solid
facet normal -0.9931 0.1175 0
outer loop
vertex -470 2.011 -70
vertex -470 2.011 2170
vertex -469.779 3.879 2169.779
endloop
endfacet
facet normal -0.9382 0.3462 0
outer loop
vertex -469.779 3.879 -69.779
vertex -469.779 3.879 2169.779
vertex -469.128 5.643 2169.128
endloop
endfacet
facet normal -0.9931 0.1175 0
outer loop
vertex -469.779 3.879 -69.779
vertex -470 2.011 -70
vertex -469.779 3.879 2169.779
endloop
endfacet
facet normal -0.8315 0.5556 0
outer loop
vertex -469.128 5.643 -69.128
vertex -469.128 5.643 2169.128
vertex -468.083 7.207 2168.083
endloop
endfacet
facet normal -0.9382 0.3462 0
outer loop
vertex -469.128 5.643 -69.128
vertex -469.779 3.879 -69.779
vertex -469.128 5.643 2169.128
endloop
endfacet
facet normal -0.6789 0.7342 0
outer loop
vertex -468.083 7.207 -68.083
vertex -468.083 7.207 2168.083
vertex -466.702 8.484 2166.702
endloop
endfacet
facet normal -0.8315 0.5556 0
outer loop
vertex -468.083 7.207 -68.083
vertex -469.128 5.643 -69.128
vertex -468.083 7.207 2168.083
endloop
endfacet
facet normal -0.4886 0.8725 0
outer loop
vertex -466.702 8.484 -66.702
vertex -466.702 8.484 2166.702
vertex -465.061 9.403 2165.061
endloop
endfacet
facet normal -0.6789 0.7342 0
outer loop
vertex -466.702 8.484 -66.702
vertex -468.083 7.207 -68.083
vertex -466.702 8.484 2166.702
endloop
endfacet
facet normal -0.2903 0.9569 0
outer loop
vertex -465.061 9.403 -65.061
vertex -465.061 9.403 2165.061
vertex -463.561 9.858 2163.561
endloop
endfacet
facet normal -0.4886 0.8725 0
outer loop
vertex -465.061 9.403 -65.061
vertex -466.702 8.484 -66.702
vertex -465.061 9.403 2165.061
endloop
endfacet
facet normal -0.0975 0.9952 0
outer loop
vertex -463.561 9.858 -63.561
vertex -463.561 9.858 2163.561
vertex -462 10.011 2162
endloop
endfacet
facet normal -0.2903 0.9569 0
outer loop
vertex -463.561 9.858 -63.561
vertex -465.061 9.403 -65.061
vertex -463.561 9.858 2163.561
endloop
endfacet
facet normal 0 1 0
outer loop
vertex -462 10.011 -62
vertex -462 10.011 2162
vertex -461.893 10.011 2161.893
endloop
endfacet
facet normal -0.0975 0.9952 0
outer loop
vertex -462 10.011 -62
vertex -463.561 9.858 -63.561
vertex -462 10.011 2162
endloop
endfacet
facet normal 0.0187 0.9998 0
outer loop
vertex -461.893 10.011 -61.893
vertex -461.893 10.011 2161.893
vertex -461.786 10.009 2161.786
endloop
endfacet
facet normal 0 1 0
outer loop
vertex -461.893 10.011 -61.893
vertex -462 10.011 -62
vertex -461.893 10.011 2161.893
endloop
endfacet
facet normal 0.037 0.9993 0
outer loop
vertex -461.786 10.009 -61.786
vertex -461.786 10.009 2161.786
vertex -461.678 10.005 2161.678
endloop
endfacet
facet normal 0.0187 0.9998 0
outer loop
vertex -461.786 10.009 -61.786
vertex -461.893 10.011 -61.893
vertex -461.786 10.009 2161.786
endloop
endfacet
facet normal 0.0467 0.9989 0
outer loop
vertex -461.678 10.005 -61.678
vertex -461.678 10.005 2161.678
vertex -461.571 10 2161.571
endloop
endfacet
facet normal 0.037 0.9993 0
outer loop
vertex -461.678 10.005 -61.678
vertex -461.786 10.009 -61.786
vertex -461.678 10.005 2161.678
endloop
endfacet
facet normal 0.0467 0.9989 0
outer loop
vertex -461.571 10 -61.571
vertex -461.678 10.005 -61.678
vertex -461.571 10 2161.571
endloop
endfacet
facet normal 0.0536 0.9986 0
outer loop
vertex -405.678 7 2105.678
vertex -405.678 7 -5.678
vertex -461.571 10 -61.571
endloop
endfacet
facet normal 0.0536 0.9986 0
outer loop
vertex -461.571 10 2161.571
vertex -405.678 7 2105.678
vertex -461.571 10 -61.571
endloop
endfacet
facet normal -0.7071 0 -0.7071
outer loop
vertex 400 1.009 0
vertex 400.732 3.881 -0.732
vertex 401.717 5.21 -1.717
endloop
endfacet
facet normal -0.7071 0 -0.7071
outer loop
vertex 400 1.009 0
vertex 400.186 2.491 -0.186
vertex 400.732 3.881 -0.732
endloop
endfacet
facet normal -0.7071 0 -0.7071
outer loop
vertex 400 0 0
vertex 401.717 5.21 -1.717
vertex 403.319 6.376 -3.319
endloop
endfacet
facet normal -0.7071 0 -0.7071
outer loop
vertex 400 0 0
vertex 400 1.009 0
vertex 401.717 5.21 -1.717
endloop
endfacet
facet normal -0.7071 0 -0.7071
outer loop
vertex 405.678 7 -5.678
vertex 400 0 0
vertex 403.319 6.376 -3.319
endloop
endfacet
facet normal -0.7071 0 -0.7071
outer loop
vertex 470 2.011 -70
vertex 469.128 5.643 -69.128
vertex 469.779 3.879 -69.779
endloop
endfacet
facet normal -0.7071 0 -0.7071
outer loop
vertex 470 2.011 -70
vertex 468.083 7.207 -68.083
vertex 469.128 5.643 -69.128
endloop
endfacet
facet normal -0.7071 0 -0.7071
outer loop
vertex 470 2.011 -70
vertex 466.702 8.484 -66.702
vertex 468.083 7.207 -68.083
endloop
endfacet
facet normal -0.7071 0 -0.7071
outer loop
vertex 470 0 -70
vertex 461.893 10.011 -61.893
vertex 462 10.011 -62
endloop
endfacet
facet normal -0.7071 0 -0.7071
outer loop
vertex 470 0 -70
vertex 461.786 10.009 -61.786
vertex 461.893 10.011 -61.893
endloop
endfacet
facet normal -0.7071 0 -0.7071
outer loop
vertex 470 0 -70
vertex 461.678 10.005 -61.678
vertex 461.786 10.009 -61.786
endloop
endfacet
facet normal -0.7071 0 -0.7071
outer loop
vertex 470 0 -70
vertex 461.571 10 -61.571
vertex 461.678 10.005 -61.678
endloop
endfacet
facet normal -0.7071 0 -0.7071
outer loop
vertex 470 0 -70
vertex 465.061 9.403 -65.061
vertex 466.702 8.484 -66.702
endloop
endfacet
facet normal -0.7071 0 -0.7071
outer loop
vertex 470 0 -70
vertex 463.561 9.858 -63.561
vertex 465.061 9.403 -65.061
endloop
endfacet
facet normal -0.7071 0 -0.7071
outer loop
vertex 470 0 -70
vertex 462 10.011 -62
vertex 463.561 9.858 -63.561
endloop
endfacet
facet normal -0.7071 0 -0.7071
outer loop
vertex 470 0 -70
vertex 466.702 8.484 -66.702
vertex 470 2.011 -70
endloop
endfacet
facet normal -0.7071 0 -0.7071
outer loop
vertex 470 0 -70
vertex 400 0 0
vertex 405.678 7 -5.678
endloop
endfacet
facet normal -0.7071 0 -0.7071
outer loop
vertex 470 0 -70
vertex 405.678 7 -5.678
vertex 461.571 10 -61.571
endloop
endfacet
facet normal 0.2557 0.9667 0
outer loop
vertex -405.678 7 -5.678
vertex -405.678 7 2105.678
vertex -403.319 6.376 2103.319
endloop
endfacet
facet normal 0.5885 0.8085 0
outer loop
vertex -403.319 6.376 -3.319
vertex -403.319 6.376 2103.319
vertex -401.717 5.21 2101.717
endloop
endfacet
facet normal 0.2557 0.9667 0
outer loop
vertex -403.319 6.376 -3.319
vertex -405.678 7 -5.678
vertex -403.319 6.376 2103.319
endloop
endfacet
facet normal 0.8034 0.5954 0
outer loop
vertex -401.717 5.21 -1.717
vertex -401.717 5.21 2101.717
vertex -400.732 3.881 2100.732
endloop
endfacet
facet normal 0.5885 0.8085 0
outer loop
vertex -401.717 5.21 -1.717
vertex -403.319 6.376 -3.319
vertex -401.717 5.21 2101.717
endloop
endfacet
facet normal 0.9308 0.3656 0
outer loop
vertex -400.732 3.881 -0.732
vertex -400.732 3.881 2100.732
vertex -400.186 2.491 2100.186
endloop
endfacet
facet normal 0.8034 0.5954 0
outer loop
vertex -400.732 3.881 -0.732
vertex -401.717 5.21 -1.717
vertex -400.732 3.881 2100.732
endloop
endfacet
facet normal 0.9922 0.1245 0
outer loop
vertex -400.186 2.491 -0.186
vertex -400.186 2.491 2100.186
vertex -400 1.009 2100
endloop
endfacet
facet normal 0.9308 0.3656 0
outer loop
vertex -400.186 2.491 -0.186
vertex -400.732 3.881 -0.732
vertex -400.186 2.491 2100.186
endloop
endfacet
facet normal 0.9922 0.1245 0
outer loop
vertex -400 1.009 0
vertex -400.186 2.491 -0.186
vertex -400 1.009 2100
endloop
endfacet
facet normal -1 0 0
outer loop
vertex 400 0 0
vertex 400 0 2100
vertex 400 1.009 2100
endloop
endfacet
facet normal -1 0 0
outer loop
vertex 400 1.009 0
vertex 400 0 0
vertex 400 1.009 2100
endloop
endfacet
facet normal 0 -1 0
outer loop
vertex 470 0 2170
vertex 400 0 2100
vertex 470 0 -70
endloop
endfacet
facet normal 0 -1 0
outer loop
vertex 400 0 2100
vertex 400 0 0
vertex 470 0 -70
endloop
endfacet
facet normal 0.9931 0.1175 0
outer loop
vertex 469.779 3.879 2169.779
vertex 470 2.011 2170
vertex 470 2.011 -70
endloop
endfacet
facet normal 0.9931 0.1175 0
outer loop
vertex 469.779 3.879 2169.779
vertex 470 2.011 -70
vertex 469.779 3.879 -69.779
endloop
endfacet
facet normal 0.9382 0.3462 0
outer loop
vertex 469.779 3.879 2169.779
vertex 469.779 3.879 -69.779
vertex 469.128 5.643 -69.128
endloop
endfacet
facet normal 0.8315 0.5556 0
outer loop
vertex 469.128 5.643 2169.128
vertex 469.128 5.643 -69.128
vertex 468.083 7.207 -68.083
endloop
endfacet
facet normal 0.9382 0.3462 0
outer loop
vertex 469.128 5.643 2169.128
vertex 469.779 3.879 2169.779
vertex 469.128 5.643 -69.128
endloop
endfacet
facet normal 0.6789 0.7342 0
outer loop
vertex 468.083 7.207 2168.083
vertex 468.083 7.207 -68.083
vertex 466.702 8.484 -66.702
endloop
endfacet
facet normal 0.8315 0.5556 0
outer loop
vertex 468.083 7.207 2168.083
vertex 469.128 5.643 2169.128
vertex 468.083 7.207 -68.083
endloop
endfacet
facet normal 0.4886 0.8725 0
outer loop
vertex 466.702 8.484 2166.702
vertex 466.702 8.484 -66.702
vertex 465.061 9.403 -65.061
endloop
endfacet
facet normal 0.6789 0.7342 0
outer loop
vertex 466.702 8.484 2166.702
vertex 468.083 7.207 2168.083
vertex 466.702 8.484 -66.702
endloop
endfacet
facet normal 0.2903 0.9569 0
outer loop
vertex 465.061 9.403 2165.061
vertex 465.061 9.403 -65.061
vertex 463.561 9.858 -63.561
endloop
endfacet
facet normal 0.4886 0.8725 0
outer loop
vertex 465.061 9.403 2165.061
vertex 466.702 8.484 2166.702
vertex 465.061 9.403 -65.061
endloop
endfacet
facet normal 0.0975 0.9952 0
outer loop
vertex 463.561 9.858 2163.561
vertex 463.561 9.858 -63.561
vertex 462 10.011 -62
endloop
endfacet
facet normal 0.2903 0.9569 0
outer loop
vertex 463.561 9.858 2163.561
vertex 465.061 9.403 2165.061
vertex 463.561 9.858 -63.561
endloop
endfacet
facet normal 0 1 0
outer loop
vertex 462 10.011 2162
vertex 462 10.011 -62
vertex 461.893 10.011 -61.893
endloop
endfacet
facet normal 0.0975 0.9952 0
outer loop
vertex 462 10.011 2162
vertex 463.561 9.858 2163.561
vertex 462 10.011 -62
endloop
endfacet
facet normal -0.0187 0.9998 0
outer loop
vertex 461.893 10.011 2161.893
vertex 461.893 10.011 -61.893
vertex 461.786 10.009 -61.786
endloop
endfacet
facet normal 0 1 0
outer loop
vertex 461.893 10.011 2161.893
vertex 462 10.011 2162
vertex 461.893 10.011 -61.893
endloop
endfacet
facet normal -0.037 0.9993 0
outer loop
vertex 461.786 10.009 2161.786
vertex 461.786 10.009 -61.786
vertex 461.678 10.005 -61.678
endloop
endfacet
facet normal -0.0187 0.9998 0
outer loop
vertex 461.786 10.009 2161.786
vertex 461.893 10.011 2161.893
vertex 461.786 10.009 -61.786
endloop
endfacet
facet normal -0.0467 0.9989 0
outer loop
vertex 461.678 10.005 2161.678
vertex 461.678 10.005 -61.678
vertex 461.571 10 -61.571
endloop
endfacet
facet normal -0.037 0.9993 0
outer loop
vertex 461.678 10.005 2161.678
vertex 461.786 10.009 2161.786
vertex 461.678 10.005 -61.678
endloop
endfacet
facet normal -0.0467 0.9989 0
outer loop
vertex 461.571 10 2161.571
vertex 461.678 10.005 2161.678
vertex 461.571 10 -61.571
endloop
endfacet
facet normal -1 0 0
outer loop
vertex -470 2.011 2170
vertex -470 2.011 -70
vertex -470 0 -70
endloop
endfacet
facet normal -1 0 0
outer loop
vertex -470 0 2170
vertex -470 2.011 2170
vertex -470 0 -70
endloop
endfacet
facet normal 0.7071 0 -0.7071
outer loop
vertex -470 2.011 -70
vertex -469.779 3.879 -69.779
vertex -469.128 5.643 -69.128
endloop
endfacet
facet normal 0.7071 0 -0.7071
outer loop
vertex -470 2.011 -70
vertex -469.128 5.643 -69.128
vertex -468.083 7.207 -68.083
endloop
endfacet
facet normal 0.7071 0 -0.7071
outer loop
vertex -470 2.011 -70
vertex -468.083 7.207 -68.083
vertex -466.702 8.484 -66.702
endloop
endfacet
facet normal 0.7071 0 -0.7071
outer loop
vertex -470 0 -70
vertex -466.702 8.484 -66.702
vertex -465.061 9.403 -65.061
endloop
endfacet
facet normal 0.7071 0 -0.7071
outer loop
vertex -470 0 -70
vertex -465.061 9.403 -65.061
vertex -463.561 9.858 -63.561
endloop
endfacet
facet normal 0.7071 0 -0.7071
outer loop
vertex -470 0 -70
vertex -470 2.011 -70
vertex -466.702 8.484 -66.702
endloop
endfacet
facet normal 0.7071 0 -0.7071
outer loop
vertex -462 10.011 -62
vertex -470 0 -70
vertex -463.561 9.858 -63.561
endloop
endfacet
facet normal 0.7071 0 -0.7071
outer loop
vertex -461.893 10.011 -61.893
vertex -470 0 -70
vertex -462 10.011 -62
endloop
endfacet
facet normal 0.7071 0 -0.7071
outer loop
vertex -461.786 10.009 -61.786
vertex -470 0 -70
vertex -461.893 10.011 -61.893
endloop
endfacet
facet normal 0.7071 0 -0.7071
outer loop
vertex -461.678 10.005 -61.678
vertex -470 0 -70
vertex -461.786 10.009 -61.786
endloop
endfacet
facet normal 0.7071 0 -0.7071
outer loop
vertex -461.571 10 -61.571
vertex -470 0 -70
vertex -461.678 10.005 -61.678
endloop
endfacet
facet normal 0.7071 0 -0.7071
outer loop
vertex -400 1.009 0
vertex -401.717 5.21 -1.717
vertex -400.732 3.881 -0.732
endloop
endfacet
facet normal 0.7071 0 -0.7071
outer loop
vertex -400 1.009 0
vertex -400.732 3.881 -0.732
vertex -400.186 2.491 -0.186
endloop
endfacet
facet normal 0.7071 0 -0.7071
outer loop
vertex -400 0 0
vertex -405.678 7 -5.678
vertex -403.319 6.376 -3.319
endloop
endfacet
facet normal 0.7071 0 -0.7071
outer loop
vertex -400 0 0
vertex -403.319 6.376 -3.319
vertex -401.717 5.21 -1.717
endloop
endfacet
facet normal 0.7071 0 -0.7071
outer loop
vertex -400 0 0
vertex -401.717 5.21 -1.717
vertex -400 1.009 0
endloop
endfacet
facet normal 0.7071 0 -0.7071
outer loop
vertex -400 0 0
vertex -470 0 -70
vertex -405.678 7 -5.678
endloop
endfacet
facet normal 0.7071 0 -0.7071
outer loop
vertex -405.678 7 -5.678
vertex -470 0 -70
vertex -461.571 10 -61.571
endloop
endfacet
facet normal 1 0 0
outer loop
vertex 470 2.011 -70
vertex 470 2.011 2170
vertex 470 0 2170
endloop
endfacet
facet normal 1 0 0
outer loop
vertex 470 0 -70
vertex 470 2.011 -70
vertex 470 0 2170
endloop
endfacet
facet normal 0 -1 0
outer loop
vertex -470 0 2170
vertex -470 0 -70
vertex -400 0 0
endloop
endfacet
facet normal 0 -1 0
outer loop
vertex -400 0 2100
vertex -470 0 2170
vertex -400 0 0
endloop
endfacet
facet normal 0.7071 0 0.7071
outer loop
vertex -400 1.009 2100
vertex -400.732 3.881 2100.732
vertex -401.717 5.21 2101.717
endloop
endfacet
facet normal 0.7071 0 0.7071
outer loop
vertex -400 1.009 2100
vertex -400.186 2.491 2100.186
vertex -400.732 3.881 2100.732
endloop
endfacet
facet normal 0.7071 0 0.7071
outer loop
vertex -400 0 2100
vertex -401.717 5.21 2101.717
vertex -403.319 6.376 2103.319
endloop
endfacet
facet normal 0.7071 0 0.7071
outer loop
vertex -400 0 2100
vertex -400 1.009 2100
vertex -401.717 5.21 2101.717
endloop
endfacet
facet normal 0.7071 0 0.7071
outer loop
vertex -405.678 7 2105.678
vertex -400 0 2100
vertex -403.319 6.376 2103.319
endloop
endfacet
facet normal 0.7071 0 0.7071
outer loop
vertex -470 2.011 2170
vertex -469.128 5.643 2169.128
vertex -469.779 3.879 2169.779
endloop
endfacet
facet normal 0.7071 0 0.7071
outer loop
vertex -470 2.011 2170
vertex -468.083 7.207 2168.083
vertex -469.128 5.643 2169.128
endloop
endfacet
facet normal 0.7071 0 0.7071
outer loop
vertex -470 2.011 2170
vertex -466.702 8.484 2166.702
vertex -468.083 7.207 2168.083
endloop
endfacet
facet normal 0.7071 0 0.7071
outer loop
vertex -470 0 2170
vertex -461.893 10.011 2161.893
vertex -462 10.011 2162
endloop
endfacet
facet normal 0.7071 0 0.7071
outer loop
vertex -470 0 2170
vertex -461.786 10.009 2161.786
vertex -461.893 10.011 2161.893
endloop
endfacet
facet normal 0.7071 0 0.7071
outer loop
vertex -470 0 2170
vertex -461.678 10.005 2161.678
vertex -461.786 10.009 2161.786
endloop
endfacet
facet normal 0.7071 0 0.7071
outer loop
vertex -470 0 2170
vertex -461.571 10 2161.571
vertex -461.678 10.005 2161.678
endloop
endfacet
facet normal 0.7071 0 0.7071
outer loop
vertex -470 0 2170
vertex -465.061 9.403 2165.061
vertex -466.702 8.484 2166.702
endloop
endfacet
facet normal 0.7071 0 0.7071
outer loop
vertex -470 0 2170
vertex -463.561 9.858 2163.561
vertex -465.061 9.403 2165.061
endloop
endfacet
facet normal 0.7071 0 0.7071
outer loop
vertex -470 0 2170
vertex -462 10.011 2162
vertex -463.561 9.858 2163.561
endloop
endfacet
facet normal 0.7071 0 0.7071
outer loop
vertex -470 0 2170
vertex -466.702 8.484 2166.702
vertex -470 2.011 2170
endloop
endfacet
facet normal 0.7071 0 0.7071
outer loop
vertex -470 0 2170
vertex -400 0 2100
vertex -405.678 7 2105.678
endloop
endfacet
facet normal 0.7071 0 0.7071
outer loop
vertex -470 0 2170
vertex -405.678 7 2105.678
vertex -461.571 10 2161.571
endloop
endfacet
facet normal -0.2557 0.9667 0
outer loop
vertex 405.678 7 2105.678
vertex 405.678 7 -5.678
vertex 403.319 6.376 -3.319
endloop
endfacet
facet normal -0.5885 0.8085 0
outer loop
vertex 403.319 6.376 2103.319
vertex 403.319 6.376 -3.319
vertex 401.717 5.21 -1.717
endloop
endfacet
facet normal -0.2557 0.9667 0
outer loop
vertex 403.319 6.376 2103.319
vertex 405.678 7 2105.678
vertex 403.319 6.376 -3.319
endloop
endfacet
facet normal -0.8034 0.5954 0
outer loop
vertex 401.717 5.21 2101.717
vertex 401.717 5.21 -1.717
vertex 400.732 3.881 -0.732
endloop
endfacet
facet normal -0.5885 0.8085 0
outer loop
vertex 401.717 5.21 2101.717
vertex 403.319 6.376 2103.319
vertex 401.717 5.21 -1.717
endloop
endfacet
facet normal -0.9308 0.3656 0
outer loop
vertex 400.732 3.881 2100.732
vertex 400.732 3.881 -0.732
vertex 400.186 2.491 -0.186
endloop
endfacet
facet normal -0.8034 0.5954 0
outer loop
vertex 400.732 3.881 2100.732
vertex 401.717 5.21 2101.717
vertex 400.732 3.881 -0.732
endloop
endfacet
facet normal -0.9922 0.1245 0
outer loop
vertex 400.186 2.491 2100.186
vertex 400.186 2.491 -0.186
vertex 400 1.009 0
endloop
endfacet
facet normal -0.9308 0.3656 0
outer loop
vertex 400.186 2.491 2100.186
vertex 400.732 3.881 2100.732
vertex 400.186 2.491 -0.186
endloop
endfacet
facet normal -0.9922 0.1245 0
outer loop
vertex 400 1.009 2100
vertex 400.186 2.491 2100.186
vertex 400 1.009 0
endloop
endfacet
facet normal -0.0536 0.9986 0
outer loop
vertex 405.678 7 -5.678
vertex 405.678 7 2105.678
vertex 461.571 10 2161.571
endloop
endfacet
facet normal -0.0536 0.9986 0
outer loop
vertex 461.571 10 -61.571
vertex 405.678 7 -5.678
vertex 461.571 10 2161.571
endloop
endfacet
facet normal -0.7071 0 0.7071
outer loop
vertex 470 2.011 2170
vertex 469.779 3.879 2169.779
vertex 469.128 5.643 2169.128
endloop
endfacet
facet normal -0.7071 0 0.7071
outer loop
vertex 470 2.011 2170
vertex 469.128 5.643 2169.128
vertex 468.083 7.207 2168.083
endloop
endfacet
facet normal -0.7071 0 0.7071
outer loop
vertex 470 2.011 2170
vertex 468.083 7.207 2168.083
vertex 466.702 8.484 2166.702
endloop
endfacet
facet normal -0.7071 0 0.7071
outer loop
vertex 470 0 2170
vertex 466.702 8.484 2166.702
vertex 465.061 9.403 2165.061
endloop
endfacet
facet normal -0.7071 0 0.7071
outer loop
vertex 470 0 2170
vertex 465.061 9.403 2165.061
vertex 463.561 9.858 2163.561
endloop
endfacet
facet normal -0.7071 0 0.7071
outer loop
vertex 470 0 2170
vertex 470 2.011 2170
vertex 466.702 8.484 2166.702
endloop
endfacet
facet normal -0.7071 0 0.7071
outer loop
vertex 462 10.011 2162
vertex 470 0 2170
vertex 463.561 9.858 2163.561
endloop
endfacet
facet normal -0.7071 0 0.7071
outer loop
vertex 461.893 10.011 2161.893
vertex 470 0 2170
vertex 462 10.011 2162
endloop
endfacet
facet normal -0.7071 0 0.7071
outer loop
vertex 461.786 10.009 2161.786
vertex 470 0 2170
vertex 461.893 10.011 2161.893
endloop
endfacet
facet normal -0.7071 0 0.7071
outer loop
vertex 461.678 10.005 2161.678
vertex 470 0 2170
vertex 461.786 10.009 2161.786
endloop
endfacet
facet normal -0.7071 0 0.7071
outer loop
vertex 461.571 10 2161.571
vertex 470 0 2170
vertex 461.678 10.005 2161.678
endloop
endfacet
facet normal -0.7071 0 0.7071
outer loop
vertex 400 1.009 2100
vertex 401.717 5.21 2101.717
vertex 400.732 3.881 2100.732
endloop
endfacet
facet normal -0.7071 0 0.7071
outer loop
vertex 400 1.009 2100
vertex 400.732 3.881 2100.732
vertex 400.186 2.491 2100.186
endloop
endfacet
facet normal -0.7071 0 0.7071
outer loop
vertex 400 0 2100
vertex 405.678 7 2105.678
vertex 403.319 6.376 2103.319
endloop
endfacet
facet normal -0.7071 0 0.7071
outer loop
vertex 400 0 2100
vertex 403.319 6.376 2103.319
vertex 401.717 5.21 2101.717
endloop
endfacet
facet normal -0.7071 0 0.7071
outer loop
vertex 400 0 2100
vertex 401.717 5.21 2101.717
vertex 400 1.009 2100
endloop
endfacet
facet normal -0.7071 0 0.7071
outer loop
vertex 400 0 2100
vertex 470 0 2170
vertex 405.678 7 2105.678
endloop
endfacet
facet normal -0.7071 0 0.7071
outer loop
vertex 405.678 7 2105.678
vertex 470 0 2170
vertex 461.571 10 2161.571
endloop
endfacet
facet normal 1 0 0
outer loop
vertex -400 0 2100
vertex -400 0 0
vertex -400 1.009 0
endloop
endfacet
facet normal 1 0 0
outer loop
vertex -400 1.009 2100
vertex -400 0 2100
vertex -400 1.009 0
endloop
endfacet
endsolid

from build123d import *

# Parameters (mm, degrees)
EXTRUDE039436_DEPTH = 500
EXTRUDE039434_DEPTH = 500


with BuildPart() as extrude039436_internal_inferior:
    # Sketch225 (on Sketch) → Extrude039436 (new body, symmetric)
    with BuildSketch(Plane.XZ):
        Polygon((-200, 200), (200, 200), (600, -200), (-600, -200), align=None)
    extrude(amount=EXTRUDE039436_DEPTH, both=True)


with BuildPart() as compound051:
    # Sketch223 (on Sketch) → Extrude039434 (new body, symmetric)
    with BuildSketch(Plane.XZ):
        Polygon((-600, 2300), (600, 2300), (200, 1900), (-200, 1900), align=None)
    extrude(amount=EXTRUDE039434_DEPTH, both=True)

    # Compound051: union Extrude039436_internal_inferior_
    add(extrude039436_internal_inferior.part)


with BuildPart() as trim_window_internal_vertical:
    # Sweep012: sweep along a path in Sketch195
    with BuildLine(Plane.XZ) as sweep012_path:
        Line((-400, 2100), (-400, 0))
        Line((-400, 0), (400, 0))
        Line((400, 0), (400, 2100))
        Line((400, 2100), (-400, 2100))
    # Clone2D028 (on Sketch) → Sweep012 (sweep)
    with BuildSketch(Plane.ZY):
        with BuildLine():
            Line((-61.571224, 10), (-5.678418, 7))
            ThreePointArc((-5.678418, 7), (-1.645147, 5.136003), (0, 1.008624))
            Line((0, 1.008624), (0, 0))
            Line((0, 0), (-70, 0))
            Line((-70, 0), (-70, 2.011499))
            ThreePointArc((-70, 2.011499), (-67.503171, 7.81797), (-61.571224, 10))
        make_face()
    sweep(path=sweep012_path.line, is_frenet=True, transition=Transition.RIGHT)

    # Cut074: cut Compound051_
    add(compound051.part, mode=Mode.SUBTRACT)


solid = trim_window_internal_vertical.part
